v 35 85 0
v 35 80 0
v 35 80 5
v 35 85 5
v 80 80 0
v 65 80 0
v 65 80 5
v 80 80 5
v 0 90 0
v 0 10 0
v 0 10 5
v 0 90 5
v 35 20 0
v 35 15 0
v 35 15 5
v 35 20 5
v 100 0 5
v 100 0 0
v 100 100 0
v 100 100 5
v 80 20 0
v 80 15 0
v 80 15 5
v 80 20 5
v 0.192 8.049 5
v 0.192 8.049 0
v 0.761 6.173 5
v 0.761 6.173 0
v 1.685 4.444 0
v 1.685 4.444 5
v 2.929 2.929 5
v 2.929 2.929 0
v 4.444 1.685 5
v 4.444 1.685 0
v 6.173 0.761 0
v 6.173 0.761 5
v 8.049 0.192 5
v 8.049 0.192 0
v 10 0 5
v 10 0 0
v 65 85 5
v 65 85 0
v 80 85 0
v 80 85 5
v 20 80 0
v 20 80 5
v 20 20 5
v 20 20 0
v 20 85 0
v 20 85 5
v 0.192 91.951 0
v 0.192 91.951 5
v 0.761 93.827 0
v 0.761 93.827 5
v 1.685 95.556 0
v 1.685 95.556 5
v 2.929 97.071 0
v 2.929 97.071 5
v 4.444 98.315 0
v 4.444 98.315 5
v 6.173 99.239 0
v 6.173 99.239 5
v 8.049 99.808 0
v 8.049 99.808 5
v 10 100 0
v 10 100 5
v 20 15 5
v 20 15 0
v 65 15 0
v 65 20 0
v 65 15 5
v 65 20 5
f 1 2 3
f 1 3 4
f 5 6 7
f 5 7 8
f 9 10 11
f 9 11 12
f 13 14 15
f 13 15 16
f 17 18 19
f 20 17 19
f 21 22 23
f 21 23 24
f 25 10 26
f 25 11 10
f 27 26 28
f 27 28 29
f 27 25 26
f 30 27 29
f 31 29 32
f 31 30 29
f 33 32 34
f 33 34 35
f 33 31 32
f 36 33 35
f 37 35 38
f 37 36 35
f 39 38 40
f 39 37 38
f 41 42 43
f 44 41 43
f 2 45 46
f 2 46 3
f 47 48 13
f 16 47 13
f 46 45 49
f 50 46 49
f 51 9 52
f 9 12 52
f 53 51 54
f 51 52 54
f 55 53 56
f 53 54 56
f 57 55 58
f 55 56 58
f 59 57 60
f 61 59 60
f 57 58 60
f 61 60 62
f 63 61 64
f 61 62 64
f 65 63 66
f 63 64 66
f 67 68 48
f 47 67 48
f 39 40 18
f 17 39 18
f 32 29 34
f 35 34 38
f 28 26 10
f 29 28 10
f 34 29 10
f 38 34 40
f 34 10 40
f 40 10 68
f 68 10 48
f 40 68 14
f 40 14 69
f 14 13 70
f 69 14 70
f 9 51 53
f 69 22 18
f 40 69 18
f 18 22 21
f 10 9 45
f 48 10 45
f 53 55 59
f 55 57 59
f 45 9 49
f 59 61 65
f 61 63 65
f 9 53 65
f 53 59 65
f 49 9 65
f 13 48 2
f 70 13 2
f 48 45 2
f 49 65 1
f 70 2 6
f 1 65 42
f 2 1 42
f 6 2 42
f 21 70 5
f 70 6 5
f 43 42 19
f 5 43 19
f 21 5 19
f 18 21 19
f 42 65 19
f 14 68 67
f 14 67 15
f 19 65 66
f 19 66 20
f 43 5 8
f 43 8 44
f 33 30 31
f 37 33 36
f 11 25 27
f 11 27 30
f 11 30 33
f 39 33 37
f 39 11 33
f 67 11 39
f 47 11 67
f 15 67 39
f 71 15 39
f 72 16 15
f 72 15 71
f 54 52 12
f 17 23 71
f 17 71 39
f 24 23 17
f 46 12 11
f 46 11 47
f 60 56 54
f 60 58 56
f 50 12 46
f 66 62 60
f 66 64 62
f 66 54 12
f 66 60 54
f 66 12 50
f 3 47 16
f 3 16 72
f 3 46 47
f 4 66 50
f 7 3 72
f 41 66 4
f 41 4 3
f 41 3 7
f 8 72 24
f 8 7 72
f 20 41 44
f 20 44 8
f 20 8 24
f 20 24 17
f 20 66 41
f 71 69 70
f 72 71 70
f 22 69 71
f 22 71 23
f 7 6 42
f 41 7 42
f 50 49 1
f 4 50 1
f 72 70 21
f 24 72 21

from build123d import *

# Parameters (mm, degrees)
SKETCH1_W           = 100
SKETCH1_H           = 100
SKETCH1_W_2         = 15
SKETCH1_H_2         = 5
BOSS_EXTRUDE1_DEPTH = 5
FILLET1_R           = 10


with BuildPart() as part:
    # Sketch1 → Boss-Extrude1 (new body)
    with BuildSketch(Plane.XY):
        with Locations((50, 50)):
            Rectangle(SKETCH1_W, SKETCH1_H)
        with Locations((72.5, 82.5)):
            Rectangle(SKETCH1_W_2, SKETCH1_H_2, mode=Mode.SUBTRACT)
        with Locations((27.5, 17.5)):
            Rectangle(SKETCH1_W_2, SKETCH1_H_2, mode=Mode.SUBTRACT)
        with Locations((72.5, 17.5)):
            Rectangle(SKETCH1_W_2, SKETCH1_H_2, mode=Mode.SUBTRACT)
        with Locations((27.5, 82.5)):
            Rectangle(SKETCH1_W_2, SKETCH1_H_2, mode=Mode.SUBTRACT)
    extrude(amount=BOSS_EXTRUDE1_DEPTH)

    # Fillet1
    fillet1_edges = [part.edges().sort_by_distance(p)[0] for p in [
        (0, 100, 2.5),
        (0, 0, 2.5),
    ]]
    fillet(fillet1_edges, radius=FILLET1_R)


solid = part.part
